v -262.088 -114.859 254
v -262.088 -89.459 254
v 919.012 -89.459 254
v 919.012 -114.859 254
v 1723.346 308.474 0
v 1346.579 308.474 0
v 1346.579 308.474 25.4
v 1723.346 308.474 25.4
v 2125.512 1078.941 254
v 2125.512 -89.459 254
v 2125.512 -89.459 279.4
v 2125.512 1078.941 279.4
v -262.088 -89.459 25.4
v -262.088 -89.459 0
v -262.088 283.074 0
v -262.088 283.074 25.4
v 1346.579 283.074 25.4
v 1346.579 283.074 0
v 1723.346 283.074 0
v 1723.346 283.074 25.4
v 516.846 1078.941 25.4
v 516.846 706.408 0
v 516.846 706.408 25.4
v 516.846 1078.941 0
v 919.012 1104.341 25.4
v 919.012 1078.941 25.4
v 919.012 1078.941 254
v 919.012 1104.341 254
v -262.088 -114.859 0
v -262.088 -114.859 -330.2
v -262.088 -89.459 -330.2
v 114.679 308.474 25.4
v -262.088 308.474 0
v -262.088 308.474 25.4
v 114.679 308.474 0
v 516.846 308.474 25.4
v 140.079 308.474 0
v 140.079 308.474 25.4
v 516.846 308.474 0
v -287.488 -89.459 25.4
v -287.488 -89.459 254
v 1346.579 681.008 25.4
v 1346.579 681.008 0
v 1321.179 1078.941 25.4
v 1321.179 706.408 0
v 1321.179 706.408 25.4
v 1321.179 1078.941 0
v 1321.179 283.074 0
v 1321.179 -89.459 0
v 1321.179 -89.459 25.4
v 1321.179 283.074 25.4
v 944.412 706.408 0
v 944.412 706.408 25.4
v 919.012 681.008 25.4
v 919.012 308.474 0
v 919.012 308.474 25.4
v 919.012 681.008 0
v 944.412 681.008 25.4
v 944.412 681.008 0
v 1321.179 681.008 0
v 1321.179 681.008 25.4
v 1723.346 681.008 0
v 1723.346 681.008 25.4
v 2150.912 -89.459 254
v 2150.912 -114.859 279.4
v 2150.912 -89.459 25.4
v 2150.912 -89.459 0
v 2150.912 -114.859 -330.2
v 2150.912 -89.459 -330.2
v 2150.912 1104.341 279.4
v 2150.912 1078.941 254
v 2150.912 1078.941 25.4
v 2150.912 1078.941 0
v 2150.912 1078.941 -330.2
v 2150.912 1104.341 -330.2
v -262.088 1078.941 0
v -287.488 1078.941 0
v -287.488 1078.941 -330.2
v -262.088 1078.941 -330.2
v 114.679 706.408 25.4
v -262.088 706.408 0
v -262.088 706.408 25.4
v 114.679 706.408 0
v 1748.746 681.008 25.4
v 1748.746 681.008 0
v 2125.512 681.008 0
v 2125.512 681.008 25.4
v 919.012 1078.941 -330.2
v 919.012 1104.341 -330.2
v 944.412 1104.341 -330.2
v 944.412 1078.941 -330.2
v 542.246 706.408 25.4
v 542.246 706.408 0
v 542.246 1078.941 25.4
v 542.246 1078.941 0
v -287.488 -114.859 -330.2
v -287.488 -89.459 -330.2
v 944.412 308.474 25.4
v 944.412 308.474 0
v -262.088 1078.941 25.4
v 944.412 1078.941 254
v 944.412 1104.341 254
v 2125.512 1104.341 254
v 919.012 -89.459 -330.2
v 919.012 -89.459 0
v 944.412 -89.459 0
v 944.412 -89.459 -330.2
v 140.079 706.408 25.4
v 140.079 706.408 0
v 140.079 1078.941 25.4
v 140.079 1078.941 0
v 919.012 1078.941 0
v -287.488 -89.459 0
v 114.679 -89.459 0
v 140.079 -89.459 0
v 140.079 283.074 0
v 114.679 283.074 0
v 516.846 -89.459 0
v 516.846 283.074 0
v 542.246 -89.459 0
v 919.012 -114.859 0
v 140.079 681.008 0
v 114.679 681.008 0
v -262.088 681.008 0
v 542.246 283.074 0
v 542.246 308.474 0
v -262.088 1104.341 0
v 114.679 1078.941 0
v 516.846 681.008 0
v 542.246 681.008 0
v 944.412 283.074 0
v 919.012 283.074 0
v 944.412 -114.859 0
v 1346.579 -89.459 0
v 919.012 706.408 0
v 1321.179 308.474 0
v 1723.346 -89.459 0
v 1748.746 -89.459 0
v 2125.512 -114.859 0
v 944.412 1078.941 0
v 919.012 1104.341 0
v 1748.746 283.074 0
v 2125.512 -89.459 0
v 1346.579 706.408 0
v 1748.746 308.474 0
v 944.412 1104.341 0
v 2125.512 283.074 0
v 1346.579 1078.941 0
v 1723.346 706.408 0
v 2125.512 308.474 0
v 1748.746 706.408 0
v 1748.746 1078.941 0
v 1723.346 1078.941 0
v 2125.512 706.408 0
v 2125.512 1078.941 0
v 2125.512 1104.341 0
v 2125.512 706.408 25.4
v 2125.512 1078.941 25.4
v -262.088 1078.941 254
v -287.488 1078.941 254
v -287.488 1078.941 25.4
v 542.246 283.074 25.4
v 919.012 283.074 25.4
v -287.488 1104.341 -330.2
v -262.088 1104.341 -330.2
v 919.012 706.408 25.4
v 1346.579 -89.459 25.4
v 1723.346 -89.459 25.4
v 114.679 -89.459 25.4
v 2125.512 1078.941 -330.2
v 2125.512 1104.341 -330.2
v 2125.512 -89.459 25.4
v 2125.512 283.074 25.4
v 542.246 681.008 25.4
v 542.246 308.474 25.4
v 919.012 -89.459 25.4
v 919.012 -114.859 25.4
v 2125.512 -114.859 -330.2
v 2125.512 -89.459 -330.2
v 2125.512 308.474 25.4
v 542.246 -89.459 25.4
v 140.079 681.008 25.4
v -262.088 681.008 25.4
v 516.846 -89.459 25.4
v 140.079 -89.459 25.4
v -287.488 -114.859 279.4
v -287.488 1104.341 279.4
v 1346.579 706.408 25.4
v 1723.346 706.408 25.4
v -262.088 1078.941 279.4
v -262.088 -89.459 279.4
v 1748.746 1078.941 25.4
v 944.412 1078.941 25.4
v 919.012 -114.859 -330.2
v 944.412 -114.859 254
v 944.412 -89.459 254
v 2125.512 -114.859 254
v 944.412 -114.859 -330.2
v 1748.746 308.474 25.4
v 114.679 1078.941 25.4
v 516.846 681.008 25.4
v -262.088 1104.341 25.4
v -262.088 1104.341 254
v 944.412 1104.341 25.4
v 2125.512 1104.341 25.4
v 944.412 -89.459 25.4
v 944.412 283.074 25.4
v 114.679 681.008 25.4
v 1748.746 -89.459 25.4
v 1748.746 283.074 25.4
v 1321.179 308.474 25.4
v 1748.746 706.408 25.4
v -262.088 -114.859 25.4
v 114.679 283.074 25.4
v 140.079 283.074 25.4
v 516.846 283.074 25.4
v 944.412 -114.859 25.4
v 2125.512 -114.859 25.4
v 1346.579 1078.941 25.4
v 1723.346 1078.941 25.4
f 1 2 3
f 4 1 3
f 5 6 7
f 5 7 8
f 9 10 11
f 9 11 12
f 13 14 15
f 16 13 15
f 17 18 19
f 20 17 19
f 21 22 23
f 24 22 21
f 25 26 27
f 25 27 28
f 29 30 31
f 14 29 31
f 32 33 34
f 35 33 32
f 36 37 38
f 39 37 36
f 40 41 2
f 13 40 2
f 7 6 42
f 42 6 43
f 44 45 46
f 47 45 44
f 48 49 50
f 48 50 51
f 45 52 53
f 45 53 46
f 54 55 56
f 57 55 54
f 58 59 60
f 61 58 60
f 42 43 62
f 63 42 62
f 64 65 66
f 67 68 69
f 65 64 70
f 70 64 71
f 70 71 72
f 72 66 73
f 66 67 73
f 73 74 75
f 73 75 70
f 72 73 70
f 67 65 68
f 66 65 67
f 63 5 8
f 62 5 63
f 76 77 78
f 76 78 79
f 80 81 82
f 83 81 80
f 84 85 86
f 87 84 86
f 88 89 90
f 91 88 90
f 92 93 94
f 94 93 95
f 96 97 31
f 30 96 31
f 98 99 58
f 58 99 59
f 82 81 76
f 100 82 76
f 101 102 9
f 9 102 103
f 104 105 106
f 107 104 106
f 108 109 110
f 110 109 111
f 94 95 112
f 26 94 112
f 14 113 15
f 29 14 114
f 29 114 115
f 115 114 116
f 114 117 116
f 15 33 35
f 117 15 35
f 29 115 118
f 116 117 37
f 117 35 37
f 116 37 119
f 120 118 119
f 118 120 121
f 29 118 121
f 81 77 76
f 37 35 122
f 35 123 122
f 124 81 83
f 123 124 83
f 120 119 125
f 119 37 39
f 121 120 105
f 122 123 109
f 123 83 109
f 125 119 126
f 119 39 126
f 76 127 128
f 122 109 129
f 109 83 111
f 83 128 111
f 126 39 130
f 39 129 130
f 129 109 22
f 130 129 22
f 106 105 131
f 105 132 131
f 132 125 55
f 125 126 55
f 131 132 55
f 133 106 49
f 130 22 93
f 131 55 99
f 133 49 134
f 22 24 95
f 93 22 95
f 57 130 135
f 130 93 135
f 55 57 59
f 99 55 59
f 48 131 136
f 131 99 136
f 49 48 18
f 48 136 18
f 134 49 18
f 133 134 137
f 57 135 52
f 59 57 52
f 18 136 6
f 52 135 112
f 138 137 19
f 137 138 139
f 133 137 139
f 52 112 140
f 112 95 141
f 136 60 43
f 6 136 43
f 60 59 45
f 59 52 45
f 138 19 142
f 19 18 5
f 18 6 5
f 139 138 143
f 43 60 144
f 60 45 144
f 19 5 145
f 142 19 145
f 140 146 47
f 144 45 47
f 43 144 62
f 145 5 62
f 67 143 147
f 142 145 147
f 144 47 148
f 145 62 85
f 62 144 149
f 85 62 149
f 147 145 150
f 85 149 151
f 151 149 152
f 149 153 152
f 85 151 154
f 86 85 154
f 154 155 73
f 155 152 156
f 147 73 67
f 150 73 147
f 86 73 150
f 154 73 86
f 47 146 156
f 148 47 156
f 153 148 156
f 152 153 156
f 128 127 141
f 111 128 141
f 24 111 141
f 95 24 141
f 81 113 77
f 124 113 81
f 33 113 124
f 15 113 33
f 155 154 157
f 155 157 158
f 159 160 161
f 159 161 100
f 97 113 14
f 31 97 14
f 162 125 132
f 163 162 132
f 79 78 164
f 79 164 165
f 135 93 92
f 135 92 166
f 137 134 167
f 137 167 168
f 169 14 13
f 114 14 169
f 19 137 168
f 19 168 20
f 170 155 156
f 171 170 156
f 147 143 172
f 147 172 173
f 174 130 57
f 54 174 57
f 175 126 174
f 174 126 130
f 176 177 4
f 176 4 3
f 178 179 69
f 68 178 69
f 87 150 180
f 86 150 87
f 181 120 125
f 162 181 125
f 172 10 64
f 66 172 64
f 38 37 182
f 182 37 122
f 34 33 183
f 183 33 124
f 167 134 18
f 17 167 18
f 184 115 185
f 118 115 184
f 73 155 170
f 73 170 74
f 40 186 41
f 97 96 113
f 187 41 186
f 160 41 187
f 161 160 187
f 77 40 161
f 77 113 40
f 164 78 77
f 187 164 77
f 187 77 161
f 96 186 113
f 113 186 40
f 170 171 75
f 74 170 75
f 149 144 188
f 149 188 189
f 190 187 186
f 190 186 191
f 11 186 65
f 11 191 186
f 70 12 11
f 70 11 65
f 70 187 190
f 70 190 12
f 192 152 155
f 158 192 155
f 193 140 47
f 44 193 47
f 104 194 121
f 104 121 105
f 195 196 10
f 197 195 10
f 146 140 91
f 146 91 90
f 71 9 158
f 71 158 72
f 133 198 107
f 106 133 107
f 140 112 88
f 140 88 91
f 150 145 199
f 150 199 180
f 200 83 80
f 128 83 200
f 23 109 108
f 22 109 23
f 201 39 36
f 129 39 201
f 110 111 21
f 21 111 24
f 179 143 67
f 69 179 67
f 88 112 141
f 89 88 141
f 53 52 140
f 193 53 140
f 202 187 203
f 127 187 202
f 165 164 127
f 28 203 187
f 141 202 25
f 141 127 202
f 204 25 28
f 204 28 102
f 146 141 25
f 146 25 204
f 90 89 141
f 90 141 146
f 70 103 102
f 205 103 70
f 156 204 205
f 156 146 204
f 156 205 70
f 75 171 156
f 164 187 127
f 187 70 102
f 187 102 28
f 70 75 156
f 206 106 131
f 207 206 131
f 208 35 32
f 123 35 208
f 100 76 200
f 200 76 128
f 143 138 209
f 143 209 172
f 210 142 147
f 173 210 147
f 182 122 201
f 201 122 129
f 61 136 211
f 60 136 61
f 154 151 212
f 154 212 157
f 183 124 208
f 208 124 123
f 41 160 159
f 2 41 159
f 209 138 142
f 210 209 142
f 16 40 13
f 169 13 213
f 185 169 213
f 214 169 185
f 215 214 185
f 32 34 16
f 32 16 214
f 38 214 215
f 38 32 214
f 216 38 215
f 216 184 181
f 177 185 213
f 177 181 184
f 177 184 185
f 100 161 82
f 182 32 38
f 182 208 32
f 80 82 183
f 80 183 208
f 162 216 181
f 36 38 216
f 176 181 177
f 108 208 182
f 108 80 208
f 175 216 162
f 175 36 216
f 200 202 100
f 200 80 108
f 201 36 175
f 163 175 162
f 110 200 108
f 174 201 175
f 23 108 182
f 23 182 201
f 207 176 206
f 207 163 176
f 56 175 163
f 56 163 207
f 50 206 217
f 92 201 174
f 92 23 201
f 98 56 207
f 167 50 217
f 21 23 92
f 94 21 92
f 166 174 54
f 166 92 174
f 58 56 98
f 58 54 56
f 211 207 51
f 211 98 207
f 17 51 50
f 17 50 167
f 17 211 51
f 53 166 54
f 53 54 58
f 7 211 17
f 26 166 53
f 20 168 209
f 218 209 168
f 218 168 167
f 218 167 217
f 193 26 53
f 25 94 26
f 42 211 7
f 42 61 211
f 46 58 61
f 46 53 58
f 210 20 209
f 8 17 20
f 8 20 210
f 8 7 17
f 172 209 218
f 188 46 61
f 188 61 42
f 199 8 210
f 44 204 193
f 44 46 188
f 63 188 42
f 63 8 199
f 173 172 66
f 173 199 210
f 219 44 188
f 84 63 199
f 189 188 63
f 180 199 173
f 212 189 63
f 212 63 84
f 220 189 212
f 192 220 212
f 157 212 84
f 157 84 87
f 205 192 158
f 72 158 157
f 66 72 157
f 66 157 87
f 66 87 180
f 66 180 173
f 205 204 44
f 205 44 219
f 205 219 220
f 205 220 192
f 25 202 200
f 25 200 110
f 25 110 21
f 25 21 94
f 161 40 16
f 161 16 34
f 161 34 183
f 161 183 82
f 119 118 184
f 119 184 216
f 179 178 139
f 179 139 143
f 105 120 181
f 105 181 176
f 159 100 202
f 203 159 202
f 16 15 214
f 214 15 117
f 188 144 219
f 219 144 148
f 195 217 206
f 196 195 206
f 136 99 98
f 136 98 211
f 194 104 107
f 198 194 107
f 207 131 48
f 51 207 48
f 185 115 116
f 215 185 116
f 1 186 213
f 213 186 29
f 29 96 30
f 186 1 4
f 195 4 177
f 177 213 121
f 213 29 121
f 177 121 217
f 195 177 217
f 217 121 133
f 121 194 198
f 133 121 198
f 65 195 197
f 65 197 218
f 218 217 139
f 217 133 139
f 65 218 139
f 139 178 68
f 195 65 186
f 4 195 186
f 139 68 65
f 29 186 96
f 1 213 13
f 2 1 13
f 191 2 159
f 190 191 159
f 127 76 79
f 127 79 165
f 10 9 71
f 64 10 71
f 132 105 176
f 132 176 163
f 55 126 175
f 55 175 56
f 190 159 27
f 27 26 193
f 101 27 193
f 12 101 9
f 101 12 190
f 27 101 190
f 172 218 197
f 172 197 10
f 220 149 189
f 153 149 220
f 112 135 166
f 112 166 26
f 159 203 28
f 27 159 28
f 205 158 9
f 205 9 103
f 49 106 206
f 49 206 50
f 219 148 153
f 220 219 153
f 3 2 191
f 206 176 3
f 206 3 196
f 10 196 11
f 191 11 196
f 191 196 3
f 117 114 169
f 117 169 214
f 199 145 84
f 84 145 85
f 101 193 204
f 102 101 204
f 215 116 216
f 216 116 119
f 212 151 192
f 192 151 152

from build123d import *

# Parameters (mm, degrees)
F0_W     = 25.4
F0_H     = 25.4
F0_W_2   = 376.7666666667
F0_H_2   = 372.5333333333
F1_DEPTH = 25.4
F2_DEPTH = 330.2
F3_DEPTH = 254
F4_W     = 2438.4
F4_H     = 1219.2
F4_W_2   = 2387.6
F4_H_2   = 1168.4
F5_DEPTH = 25.4


with BuildPart() as f1:
    # F0 (on Top) → F1 (new body)
    with BuildSketch(Plane.XY):
        with Locations((931.7122847671, -102.1590246889)):
            Rectangle(F0_W, F0_H)
        Polygon((919.0122847671, 1104.3409753111), (-262.0877152329, 1104.3409753111), (-262.0877152329, 1078.9409753111), (-287.4877152329, 1078.9409753111), (-287.4877152329, -89.4590246889), (-262.0877152329, -89.4590246889), (-262.0877152329, -114.8590246889), (919.0122847671, -114.8590246889), (919.0122847671, -89.4590246889), (944.4122847671, -89.4590246889), (944.4122847671, -114.8590246889), (2125.5122847671, -114.8590246889), (2125.5122847671, -89.4590246889), (2150.9122847671, -89.4590246889), (2150.9122847671, 1078.9409753111), (2125.5122847671, 1078.9409753111), (2125.5122847671, 1104.3409753111), (944.4122847671, 1104.3409753111), (944.4122847671, 1078.9409753111), (919.0122847671, 1078.9409753111), align=None)
        with Locations((-73.7043818996, 96.8076419778)):
            Rectangle(F0_W_2, F0_H_2, mode=Mode.SUBTRACT)
        with Locations((328.4622847671, 96.8076419778)):
            Rectangle(F0_W_2, F0_H_2, mode=Mode.SUBTRACT)
        with Locations((730.6289514337, 96.8076419778)):
            Rectangle(F0_W_2, F0_H_2, mode=Mode.SUBTRACT)
        with Locations((-73.7043818996, 494.7409753111)):
            Rectangle(F0_W_2, F0_H_2, mode=Mode.SUBTRACT)
        with Locations((1132.7956181004, 96.8076419778)):
            Rectangle(F0_W_2, F0_H_2, mode=Mode.SUBTRACT)
        with Locations((1534.9622847671, 96.8076419778)):
            Rectangle(F0_W_2, F0_H_2, mode=Mode.SUBTRACT)
        with Locations((1937.1289514337, 96.8076419778)):
            Rectangle(F0_W_2, F0_H_2, mode=Mode.SUBTRACT)
        with Locations((1534.9622847671, 494.7409753111)):
            Rectangle(F0_W_2, F0_H_2, mode=Mode.SUBTRACT)
        with Locations((1937.1289514337, 494.7409753111)):
            Rectangle(F0_W_2, F0_H_2, mode=Mode.SUBTRACT)
        with Locations((328.4622847671, 494.7409753111)):
            Rectangle(F0_W_2, F0_H_2, mode=Mode.SUBTRACT)
        with Locations((730.6289514337, 494.7409753111)):
            Rectangle(F0_W_2, F0_H_2, mode=Mode.SUBTRACT)
        with Locations((-73.7043818996, 892.6743086444)):
            Rectangle(F0_W_2, F0_H_2, mode=Mode.SUBTRACT)
        with Locations((328.4622847671, 892.6743086444)):
            Rectangle(F0_W_2, F0_H_2, mode=Mode.SUBTRACT)
        with Locations((730.6289514337, 892.6743086444)):
            Rectangle(F0_W_2, F0_H_2, mode=Mode.SUBTRACT)
        with Locations((1132.7956181004, 494.7409753111)):
            Rectangle(F0_W_2, F0_H_2, mode=Mode.SUBTRACT)
        with Locations((1132.7956181004, 892.6743086444)):
            Rectangle(F0_W_2, F0_H_2, mode=Mode.SUBTRACT)
        with Locations((1534.9622847671, 892.6743086444)):
            Rectangle(F0_W_2, F0_H_2, mode=Mode.SUBTRACT)
        with Locations((1937.1289514337, 892.6743086444)):
            Rectangle(F0_W_2, F0_H_2, mode=Mode.SUBTRACT)
        with Locations((-274.7877152329, -102.1590246889)):
            Rectangle(F0_W, F0_H)
        with Locations((931.7122847671, 1091.6409753111)):
            Rectangle(F0_W, F0_H)
        with Locations((-274.7877152329, 1091.6409753111)):
            Rectangle(F0_W, F0_H)
        with Locations((2138.2122847671, -102.1590246889)):
            Rectangle(F0_W, F0_H)
        with Locations((2138.2122847671, 1091.6409753111)):
            Rectangle(F0_W, F0_H)
    extrude(amount=F1_DEPTH)

    # F0 (on Top) → F2 (join)
    with BuildSketch(Plane.XY):
        with Locations((-274.7877152329, 1091.6409753111)):
            Rectangle(F0_W, F0_H)
        with Locations((-274.7877152329, -102.1590246889)):
            Rectangle(F0_W, F0_H)
        with Locations((931.7122847671, -102.1590246889)):
            Rectangle(F0_W, F0_H)
        with Locations((2138.2122847671, -102.1590246889)):
            Rectangle(F0_W, F0_H)
        with Locations((2138.2122847671, 1091.6409753111)):
            Rectangle(F0_W, F0_H)
        with Locations((931.7122847671, 1091.6409753111)):
            Rectangle(F0_W, F0_H)
    extrude(amount=-F2_DEPTH)

    # F0 (on Top) → F3 (join)
    with BuildSketch(Plane.XY):
        with Locations((-274.7877152329, 1091.6409753111)):
            Rectangle(F0_W, F0_H)
        with Locations((931.7122847671, 1091.6409753111)):
            Rectangle(F0_W, F0_H)
        with Locations((-274.7877152329, -102.1590246889)):
            Rectangle(F0_W, F0_H)
        with Locations((931.7122847671, -102.1590246889)):
            Rectangle(F0_W, F0_H)
        with Locations((2138.2122847671, -102.1590246889)):
            Rectangle(F0_W, F0_H)
        with Locations((2138.2122847671, 1091.6409753111)):
            Rectangle(F0_W, F0_H)
    extrude(amount=F3_DEPTH)

    # F4 (on face) → F5 (join)
    with BuildSketch(Plane.XY.offset(254)):
        with Locations((931.7122847671, 494.7409753111)):
            Rectangle(F4_W, F4_H)
        with Locations((931.7122847671, 494.7409753111)):
            Rectangle(F4_W_2, F4_H_2, mode=Mode.SUBTRACT)
    extrude(amount=F5_DEPTH)


solid = f1.part
